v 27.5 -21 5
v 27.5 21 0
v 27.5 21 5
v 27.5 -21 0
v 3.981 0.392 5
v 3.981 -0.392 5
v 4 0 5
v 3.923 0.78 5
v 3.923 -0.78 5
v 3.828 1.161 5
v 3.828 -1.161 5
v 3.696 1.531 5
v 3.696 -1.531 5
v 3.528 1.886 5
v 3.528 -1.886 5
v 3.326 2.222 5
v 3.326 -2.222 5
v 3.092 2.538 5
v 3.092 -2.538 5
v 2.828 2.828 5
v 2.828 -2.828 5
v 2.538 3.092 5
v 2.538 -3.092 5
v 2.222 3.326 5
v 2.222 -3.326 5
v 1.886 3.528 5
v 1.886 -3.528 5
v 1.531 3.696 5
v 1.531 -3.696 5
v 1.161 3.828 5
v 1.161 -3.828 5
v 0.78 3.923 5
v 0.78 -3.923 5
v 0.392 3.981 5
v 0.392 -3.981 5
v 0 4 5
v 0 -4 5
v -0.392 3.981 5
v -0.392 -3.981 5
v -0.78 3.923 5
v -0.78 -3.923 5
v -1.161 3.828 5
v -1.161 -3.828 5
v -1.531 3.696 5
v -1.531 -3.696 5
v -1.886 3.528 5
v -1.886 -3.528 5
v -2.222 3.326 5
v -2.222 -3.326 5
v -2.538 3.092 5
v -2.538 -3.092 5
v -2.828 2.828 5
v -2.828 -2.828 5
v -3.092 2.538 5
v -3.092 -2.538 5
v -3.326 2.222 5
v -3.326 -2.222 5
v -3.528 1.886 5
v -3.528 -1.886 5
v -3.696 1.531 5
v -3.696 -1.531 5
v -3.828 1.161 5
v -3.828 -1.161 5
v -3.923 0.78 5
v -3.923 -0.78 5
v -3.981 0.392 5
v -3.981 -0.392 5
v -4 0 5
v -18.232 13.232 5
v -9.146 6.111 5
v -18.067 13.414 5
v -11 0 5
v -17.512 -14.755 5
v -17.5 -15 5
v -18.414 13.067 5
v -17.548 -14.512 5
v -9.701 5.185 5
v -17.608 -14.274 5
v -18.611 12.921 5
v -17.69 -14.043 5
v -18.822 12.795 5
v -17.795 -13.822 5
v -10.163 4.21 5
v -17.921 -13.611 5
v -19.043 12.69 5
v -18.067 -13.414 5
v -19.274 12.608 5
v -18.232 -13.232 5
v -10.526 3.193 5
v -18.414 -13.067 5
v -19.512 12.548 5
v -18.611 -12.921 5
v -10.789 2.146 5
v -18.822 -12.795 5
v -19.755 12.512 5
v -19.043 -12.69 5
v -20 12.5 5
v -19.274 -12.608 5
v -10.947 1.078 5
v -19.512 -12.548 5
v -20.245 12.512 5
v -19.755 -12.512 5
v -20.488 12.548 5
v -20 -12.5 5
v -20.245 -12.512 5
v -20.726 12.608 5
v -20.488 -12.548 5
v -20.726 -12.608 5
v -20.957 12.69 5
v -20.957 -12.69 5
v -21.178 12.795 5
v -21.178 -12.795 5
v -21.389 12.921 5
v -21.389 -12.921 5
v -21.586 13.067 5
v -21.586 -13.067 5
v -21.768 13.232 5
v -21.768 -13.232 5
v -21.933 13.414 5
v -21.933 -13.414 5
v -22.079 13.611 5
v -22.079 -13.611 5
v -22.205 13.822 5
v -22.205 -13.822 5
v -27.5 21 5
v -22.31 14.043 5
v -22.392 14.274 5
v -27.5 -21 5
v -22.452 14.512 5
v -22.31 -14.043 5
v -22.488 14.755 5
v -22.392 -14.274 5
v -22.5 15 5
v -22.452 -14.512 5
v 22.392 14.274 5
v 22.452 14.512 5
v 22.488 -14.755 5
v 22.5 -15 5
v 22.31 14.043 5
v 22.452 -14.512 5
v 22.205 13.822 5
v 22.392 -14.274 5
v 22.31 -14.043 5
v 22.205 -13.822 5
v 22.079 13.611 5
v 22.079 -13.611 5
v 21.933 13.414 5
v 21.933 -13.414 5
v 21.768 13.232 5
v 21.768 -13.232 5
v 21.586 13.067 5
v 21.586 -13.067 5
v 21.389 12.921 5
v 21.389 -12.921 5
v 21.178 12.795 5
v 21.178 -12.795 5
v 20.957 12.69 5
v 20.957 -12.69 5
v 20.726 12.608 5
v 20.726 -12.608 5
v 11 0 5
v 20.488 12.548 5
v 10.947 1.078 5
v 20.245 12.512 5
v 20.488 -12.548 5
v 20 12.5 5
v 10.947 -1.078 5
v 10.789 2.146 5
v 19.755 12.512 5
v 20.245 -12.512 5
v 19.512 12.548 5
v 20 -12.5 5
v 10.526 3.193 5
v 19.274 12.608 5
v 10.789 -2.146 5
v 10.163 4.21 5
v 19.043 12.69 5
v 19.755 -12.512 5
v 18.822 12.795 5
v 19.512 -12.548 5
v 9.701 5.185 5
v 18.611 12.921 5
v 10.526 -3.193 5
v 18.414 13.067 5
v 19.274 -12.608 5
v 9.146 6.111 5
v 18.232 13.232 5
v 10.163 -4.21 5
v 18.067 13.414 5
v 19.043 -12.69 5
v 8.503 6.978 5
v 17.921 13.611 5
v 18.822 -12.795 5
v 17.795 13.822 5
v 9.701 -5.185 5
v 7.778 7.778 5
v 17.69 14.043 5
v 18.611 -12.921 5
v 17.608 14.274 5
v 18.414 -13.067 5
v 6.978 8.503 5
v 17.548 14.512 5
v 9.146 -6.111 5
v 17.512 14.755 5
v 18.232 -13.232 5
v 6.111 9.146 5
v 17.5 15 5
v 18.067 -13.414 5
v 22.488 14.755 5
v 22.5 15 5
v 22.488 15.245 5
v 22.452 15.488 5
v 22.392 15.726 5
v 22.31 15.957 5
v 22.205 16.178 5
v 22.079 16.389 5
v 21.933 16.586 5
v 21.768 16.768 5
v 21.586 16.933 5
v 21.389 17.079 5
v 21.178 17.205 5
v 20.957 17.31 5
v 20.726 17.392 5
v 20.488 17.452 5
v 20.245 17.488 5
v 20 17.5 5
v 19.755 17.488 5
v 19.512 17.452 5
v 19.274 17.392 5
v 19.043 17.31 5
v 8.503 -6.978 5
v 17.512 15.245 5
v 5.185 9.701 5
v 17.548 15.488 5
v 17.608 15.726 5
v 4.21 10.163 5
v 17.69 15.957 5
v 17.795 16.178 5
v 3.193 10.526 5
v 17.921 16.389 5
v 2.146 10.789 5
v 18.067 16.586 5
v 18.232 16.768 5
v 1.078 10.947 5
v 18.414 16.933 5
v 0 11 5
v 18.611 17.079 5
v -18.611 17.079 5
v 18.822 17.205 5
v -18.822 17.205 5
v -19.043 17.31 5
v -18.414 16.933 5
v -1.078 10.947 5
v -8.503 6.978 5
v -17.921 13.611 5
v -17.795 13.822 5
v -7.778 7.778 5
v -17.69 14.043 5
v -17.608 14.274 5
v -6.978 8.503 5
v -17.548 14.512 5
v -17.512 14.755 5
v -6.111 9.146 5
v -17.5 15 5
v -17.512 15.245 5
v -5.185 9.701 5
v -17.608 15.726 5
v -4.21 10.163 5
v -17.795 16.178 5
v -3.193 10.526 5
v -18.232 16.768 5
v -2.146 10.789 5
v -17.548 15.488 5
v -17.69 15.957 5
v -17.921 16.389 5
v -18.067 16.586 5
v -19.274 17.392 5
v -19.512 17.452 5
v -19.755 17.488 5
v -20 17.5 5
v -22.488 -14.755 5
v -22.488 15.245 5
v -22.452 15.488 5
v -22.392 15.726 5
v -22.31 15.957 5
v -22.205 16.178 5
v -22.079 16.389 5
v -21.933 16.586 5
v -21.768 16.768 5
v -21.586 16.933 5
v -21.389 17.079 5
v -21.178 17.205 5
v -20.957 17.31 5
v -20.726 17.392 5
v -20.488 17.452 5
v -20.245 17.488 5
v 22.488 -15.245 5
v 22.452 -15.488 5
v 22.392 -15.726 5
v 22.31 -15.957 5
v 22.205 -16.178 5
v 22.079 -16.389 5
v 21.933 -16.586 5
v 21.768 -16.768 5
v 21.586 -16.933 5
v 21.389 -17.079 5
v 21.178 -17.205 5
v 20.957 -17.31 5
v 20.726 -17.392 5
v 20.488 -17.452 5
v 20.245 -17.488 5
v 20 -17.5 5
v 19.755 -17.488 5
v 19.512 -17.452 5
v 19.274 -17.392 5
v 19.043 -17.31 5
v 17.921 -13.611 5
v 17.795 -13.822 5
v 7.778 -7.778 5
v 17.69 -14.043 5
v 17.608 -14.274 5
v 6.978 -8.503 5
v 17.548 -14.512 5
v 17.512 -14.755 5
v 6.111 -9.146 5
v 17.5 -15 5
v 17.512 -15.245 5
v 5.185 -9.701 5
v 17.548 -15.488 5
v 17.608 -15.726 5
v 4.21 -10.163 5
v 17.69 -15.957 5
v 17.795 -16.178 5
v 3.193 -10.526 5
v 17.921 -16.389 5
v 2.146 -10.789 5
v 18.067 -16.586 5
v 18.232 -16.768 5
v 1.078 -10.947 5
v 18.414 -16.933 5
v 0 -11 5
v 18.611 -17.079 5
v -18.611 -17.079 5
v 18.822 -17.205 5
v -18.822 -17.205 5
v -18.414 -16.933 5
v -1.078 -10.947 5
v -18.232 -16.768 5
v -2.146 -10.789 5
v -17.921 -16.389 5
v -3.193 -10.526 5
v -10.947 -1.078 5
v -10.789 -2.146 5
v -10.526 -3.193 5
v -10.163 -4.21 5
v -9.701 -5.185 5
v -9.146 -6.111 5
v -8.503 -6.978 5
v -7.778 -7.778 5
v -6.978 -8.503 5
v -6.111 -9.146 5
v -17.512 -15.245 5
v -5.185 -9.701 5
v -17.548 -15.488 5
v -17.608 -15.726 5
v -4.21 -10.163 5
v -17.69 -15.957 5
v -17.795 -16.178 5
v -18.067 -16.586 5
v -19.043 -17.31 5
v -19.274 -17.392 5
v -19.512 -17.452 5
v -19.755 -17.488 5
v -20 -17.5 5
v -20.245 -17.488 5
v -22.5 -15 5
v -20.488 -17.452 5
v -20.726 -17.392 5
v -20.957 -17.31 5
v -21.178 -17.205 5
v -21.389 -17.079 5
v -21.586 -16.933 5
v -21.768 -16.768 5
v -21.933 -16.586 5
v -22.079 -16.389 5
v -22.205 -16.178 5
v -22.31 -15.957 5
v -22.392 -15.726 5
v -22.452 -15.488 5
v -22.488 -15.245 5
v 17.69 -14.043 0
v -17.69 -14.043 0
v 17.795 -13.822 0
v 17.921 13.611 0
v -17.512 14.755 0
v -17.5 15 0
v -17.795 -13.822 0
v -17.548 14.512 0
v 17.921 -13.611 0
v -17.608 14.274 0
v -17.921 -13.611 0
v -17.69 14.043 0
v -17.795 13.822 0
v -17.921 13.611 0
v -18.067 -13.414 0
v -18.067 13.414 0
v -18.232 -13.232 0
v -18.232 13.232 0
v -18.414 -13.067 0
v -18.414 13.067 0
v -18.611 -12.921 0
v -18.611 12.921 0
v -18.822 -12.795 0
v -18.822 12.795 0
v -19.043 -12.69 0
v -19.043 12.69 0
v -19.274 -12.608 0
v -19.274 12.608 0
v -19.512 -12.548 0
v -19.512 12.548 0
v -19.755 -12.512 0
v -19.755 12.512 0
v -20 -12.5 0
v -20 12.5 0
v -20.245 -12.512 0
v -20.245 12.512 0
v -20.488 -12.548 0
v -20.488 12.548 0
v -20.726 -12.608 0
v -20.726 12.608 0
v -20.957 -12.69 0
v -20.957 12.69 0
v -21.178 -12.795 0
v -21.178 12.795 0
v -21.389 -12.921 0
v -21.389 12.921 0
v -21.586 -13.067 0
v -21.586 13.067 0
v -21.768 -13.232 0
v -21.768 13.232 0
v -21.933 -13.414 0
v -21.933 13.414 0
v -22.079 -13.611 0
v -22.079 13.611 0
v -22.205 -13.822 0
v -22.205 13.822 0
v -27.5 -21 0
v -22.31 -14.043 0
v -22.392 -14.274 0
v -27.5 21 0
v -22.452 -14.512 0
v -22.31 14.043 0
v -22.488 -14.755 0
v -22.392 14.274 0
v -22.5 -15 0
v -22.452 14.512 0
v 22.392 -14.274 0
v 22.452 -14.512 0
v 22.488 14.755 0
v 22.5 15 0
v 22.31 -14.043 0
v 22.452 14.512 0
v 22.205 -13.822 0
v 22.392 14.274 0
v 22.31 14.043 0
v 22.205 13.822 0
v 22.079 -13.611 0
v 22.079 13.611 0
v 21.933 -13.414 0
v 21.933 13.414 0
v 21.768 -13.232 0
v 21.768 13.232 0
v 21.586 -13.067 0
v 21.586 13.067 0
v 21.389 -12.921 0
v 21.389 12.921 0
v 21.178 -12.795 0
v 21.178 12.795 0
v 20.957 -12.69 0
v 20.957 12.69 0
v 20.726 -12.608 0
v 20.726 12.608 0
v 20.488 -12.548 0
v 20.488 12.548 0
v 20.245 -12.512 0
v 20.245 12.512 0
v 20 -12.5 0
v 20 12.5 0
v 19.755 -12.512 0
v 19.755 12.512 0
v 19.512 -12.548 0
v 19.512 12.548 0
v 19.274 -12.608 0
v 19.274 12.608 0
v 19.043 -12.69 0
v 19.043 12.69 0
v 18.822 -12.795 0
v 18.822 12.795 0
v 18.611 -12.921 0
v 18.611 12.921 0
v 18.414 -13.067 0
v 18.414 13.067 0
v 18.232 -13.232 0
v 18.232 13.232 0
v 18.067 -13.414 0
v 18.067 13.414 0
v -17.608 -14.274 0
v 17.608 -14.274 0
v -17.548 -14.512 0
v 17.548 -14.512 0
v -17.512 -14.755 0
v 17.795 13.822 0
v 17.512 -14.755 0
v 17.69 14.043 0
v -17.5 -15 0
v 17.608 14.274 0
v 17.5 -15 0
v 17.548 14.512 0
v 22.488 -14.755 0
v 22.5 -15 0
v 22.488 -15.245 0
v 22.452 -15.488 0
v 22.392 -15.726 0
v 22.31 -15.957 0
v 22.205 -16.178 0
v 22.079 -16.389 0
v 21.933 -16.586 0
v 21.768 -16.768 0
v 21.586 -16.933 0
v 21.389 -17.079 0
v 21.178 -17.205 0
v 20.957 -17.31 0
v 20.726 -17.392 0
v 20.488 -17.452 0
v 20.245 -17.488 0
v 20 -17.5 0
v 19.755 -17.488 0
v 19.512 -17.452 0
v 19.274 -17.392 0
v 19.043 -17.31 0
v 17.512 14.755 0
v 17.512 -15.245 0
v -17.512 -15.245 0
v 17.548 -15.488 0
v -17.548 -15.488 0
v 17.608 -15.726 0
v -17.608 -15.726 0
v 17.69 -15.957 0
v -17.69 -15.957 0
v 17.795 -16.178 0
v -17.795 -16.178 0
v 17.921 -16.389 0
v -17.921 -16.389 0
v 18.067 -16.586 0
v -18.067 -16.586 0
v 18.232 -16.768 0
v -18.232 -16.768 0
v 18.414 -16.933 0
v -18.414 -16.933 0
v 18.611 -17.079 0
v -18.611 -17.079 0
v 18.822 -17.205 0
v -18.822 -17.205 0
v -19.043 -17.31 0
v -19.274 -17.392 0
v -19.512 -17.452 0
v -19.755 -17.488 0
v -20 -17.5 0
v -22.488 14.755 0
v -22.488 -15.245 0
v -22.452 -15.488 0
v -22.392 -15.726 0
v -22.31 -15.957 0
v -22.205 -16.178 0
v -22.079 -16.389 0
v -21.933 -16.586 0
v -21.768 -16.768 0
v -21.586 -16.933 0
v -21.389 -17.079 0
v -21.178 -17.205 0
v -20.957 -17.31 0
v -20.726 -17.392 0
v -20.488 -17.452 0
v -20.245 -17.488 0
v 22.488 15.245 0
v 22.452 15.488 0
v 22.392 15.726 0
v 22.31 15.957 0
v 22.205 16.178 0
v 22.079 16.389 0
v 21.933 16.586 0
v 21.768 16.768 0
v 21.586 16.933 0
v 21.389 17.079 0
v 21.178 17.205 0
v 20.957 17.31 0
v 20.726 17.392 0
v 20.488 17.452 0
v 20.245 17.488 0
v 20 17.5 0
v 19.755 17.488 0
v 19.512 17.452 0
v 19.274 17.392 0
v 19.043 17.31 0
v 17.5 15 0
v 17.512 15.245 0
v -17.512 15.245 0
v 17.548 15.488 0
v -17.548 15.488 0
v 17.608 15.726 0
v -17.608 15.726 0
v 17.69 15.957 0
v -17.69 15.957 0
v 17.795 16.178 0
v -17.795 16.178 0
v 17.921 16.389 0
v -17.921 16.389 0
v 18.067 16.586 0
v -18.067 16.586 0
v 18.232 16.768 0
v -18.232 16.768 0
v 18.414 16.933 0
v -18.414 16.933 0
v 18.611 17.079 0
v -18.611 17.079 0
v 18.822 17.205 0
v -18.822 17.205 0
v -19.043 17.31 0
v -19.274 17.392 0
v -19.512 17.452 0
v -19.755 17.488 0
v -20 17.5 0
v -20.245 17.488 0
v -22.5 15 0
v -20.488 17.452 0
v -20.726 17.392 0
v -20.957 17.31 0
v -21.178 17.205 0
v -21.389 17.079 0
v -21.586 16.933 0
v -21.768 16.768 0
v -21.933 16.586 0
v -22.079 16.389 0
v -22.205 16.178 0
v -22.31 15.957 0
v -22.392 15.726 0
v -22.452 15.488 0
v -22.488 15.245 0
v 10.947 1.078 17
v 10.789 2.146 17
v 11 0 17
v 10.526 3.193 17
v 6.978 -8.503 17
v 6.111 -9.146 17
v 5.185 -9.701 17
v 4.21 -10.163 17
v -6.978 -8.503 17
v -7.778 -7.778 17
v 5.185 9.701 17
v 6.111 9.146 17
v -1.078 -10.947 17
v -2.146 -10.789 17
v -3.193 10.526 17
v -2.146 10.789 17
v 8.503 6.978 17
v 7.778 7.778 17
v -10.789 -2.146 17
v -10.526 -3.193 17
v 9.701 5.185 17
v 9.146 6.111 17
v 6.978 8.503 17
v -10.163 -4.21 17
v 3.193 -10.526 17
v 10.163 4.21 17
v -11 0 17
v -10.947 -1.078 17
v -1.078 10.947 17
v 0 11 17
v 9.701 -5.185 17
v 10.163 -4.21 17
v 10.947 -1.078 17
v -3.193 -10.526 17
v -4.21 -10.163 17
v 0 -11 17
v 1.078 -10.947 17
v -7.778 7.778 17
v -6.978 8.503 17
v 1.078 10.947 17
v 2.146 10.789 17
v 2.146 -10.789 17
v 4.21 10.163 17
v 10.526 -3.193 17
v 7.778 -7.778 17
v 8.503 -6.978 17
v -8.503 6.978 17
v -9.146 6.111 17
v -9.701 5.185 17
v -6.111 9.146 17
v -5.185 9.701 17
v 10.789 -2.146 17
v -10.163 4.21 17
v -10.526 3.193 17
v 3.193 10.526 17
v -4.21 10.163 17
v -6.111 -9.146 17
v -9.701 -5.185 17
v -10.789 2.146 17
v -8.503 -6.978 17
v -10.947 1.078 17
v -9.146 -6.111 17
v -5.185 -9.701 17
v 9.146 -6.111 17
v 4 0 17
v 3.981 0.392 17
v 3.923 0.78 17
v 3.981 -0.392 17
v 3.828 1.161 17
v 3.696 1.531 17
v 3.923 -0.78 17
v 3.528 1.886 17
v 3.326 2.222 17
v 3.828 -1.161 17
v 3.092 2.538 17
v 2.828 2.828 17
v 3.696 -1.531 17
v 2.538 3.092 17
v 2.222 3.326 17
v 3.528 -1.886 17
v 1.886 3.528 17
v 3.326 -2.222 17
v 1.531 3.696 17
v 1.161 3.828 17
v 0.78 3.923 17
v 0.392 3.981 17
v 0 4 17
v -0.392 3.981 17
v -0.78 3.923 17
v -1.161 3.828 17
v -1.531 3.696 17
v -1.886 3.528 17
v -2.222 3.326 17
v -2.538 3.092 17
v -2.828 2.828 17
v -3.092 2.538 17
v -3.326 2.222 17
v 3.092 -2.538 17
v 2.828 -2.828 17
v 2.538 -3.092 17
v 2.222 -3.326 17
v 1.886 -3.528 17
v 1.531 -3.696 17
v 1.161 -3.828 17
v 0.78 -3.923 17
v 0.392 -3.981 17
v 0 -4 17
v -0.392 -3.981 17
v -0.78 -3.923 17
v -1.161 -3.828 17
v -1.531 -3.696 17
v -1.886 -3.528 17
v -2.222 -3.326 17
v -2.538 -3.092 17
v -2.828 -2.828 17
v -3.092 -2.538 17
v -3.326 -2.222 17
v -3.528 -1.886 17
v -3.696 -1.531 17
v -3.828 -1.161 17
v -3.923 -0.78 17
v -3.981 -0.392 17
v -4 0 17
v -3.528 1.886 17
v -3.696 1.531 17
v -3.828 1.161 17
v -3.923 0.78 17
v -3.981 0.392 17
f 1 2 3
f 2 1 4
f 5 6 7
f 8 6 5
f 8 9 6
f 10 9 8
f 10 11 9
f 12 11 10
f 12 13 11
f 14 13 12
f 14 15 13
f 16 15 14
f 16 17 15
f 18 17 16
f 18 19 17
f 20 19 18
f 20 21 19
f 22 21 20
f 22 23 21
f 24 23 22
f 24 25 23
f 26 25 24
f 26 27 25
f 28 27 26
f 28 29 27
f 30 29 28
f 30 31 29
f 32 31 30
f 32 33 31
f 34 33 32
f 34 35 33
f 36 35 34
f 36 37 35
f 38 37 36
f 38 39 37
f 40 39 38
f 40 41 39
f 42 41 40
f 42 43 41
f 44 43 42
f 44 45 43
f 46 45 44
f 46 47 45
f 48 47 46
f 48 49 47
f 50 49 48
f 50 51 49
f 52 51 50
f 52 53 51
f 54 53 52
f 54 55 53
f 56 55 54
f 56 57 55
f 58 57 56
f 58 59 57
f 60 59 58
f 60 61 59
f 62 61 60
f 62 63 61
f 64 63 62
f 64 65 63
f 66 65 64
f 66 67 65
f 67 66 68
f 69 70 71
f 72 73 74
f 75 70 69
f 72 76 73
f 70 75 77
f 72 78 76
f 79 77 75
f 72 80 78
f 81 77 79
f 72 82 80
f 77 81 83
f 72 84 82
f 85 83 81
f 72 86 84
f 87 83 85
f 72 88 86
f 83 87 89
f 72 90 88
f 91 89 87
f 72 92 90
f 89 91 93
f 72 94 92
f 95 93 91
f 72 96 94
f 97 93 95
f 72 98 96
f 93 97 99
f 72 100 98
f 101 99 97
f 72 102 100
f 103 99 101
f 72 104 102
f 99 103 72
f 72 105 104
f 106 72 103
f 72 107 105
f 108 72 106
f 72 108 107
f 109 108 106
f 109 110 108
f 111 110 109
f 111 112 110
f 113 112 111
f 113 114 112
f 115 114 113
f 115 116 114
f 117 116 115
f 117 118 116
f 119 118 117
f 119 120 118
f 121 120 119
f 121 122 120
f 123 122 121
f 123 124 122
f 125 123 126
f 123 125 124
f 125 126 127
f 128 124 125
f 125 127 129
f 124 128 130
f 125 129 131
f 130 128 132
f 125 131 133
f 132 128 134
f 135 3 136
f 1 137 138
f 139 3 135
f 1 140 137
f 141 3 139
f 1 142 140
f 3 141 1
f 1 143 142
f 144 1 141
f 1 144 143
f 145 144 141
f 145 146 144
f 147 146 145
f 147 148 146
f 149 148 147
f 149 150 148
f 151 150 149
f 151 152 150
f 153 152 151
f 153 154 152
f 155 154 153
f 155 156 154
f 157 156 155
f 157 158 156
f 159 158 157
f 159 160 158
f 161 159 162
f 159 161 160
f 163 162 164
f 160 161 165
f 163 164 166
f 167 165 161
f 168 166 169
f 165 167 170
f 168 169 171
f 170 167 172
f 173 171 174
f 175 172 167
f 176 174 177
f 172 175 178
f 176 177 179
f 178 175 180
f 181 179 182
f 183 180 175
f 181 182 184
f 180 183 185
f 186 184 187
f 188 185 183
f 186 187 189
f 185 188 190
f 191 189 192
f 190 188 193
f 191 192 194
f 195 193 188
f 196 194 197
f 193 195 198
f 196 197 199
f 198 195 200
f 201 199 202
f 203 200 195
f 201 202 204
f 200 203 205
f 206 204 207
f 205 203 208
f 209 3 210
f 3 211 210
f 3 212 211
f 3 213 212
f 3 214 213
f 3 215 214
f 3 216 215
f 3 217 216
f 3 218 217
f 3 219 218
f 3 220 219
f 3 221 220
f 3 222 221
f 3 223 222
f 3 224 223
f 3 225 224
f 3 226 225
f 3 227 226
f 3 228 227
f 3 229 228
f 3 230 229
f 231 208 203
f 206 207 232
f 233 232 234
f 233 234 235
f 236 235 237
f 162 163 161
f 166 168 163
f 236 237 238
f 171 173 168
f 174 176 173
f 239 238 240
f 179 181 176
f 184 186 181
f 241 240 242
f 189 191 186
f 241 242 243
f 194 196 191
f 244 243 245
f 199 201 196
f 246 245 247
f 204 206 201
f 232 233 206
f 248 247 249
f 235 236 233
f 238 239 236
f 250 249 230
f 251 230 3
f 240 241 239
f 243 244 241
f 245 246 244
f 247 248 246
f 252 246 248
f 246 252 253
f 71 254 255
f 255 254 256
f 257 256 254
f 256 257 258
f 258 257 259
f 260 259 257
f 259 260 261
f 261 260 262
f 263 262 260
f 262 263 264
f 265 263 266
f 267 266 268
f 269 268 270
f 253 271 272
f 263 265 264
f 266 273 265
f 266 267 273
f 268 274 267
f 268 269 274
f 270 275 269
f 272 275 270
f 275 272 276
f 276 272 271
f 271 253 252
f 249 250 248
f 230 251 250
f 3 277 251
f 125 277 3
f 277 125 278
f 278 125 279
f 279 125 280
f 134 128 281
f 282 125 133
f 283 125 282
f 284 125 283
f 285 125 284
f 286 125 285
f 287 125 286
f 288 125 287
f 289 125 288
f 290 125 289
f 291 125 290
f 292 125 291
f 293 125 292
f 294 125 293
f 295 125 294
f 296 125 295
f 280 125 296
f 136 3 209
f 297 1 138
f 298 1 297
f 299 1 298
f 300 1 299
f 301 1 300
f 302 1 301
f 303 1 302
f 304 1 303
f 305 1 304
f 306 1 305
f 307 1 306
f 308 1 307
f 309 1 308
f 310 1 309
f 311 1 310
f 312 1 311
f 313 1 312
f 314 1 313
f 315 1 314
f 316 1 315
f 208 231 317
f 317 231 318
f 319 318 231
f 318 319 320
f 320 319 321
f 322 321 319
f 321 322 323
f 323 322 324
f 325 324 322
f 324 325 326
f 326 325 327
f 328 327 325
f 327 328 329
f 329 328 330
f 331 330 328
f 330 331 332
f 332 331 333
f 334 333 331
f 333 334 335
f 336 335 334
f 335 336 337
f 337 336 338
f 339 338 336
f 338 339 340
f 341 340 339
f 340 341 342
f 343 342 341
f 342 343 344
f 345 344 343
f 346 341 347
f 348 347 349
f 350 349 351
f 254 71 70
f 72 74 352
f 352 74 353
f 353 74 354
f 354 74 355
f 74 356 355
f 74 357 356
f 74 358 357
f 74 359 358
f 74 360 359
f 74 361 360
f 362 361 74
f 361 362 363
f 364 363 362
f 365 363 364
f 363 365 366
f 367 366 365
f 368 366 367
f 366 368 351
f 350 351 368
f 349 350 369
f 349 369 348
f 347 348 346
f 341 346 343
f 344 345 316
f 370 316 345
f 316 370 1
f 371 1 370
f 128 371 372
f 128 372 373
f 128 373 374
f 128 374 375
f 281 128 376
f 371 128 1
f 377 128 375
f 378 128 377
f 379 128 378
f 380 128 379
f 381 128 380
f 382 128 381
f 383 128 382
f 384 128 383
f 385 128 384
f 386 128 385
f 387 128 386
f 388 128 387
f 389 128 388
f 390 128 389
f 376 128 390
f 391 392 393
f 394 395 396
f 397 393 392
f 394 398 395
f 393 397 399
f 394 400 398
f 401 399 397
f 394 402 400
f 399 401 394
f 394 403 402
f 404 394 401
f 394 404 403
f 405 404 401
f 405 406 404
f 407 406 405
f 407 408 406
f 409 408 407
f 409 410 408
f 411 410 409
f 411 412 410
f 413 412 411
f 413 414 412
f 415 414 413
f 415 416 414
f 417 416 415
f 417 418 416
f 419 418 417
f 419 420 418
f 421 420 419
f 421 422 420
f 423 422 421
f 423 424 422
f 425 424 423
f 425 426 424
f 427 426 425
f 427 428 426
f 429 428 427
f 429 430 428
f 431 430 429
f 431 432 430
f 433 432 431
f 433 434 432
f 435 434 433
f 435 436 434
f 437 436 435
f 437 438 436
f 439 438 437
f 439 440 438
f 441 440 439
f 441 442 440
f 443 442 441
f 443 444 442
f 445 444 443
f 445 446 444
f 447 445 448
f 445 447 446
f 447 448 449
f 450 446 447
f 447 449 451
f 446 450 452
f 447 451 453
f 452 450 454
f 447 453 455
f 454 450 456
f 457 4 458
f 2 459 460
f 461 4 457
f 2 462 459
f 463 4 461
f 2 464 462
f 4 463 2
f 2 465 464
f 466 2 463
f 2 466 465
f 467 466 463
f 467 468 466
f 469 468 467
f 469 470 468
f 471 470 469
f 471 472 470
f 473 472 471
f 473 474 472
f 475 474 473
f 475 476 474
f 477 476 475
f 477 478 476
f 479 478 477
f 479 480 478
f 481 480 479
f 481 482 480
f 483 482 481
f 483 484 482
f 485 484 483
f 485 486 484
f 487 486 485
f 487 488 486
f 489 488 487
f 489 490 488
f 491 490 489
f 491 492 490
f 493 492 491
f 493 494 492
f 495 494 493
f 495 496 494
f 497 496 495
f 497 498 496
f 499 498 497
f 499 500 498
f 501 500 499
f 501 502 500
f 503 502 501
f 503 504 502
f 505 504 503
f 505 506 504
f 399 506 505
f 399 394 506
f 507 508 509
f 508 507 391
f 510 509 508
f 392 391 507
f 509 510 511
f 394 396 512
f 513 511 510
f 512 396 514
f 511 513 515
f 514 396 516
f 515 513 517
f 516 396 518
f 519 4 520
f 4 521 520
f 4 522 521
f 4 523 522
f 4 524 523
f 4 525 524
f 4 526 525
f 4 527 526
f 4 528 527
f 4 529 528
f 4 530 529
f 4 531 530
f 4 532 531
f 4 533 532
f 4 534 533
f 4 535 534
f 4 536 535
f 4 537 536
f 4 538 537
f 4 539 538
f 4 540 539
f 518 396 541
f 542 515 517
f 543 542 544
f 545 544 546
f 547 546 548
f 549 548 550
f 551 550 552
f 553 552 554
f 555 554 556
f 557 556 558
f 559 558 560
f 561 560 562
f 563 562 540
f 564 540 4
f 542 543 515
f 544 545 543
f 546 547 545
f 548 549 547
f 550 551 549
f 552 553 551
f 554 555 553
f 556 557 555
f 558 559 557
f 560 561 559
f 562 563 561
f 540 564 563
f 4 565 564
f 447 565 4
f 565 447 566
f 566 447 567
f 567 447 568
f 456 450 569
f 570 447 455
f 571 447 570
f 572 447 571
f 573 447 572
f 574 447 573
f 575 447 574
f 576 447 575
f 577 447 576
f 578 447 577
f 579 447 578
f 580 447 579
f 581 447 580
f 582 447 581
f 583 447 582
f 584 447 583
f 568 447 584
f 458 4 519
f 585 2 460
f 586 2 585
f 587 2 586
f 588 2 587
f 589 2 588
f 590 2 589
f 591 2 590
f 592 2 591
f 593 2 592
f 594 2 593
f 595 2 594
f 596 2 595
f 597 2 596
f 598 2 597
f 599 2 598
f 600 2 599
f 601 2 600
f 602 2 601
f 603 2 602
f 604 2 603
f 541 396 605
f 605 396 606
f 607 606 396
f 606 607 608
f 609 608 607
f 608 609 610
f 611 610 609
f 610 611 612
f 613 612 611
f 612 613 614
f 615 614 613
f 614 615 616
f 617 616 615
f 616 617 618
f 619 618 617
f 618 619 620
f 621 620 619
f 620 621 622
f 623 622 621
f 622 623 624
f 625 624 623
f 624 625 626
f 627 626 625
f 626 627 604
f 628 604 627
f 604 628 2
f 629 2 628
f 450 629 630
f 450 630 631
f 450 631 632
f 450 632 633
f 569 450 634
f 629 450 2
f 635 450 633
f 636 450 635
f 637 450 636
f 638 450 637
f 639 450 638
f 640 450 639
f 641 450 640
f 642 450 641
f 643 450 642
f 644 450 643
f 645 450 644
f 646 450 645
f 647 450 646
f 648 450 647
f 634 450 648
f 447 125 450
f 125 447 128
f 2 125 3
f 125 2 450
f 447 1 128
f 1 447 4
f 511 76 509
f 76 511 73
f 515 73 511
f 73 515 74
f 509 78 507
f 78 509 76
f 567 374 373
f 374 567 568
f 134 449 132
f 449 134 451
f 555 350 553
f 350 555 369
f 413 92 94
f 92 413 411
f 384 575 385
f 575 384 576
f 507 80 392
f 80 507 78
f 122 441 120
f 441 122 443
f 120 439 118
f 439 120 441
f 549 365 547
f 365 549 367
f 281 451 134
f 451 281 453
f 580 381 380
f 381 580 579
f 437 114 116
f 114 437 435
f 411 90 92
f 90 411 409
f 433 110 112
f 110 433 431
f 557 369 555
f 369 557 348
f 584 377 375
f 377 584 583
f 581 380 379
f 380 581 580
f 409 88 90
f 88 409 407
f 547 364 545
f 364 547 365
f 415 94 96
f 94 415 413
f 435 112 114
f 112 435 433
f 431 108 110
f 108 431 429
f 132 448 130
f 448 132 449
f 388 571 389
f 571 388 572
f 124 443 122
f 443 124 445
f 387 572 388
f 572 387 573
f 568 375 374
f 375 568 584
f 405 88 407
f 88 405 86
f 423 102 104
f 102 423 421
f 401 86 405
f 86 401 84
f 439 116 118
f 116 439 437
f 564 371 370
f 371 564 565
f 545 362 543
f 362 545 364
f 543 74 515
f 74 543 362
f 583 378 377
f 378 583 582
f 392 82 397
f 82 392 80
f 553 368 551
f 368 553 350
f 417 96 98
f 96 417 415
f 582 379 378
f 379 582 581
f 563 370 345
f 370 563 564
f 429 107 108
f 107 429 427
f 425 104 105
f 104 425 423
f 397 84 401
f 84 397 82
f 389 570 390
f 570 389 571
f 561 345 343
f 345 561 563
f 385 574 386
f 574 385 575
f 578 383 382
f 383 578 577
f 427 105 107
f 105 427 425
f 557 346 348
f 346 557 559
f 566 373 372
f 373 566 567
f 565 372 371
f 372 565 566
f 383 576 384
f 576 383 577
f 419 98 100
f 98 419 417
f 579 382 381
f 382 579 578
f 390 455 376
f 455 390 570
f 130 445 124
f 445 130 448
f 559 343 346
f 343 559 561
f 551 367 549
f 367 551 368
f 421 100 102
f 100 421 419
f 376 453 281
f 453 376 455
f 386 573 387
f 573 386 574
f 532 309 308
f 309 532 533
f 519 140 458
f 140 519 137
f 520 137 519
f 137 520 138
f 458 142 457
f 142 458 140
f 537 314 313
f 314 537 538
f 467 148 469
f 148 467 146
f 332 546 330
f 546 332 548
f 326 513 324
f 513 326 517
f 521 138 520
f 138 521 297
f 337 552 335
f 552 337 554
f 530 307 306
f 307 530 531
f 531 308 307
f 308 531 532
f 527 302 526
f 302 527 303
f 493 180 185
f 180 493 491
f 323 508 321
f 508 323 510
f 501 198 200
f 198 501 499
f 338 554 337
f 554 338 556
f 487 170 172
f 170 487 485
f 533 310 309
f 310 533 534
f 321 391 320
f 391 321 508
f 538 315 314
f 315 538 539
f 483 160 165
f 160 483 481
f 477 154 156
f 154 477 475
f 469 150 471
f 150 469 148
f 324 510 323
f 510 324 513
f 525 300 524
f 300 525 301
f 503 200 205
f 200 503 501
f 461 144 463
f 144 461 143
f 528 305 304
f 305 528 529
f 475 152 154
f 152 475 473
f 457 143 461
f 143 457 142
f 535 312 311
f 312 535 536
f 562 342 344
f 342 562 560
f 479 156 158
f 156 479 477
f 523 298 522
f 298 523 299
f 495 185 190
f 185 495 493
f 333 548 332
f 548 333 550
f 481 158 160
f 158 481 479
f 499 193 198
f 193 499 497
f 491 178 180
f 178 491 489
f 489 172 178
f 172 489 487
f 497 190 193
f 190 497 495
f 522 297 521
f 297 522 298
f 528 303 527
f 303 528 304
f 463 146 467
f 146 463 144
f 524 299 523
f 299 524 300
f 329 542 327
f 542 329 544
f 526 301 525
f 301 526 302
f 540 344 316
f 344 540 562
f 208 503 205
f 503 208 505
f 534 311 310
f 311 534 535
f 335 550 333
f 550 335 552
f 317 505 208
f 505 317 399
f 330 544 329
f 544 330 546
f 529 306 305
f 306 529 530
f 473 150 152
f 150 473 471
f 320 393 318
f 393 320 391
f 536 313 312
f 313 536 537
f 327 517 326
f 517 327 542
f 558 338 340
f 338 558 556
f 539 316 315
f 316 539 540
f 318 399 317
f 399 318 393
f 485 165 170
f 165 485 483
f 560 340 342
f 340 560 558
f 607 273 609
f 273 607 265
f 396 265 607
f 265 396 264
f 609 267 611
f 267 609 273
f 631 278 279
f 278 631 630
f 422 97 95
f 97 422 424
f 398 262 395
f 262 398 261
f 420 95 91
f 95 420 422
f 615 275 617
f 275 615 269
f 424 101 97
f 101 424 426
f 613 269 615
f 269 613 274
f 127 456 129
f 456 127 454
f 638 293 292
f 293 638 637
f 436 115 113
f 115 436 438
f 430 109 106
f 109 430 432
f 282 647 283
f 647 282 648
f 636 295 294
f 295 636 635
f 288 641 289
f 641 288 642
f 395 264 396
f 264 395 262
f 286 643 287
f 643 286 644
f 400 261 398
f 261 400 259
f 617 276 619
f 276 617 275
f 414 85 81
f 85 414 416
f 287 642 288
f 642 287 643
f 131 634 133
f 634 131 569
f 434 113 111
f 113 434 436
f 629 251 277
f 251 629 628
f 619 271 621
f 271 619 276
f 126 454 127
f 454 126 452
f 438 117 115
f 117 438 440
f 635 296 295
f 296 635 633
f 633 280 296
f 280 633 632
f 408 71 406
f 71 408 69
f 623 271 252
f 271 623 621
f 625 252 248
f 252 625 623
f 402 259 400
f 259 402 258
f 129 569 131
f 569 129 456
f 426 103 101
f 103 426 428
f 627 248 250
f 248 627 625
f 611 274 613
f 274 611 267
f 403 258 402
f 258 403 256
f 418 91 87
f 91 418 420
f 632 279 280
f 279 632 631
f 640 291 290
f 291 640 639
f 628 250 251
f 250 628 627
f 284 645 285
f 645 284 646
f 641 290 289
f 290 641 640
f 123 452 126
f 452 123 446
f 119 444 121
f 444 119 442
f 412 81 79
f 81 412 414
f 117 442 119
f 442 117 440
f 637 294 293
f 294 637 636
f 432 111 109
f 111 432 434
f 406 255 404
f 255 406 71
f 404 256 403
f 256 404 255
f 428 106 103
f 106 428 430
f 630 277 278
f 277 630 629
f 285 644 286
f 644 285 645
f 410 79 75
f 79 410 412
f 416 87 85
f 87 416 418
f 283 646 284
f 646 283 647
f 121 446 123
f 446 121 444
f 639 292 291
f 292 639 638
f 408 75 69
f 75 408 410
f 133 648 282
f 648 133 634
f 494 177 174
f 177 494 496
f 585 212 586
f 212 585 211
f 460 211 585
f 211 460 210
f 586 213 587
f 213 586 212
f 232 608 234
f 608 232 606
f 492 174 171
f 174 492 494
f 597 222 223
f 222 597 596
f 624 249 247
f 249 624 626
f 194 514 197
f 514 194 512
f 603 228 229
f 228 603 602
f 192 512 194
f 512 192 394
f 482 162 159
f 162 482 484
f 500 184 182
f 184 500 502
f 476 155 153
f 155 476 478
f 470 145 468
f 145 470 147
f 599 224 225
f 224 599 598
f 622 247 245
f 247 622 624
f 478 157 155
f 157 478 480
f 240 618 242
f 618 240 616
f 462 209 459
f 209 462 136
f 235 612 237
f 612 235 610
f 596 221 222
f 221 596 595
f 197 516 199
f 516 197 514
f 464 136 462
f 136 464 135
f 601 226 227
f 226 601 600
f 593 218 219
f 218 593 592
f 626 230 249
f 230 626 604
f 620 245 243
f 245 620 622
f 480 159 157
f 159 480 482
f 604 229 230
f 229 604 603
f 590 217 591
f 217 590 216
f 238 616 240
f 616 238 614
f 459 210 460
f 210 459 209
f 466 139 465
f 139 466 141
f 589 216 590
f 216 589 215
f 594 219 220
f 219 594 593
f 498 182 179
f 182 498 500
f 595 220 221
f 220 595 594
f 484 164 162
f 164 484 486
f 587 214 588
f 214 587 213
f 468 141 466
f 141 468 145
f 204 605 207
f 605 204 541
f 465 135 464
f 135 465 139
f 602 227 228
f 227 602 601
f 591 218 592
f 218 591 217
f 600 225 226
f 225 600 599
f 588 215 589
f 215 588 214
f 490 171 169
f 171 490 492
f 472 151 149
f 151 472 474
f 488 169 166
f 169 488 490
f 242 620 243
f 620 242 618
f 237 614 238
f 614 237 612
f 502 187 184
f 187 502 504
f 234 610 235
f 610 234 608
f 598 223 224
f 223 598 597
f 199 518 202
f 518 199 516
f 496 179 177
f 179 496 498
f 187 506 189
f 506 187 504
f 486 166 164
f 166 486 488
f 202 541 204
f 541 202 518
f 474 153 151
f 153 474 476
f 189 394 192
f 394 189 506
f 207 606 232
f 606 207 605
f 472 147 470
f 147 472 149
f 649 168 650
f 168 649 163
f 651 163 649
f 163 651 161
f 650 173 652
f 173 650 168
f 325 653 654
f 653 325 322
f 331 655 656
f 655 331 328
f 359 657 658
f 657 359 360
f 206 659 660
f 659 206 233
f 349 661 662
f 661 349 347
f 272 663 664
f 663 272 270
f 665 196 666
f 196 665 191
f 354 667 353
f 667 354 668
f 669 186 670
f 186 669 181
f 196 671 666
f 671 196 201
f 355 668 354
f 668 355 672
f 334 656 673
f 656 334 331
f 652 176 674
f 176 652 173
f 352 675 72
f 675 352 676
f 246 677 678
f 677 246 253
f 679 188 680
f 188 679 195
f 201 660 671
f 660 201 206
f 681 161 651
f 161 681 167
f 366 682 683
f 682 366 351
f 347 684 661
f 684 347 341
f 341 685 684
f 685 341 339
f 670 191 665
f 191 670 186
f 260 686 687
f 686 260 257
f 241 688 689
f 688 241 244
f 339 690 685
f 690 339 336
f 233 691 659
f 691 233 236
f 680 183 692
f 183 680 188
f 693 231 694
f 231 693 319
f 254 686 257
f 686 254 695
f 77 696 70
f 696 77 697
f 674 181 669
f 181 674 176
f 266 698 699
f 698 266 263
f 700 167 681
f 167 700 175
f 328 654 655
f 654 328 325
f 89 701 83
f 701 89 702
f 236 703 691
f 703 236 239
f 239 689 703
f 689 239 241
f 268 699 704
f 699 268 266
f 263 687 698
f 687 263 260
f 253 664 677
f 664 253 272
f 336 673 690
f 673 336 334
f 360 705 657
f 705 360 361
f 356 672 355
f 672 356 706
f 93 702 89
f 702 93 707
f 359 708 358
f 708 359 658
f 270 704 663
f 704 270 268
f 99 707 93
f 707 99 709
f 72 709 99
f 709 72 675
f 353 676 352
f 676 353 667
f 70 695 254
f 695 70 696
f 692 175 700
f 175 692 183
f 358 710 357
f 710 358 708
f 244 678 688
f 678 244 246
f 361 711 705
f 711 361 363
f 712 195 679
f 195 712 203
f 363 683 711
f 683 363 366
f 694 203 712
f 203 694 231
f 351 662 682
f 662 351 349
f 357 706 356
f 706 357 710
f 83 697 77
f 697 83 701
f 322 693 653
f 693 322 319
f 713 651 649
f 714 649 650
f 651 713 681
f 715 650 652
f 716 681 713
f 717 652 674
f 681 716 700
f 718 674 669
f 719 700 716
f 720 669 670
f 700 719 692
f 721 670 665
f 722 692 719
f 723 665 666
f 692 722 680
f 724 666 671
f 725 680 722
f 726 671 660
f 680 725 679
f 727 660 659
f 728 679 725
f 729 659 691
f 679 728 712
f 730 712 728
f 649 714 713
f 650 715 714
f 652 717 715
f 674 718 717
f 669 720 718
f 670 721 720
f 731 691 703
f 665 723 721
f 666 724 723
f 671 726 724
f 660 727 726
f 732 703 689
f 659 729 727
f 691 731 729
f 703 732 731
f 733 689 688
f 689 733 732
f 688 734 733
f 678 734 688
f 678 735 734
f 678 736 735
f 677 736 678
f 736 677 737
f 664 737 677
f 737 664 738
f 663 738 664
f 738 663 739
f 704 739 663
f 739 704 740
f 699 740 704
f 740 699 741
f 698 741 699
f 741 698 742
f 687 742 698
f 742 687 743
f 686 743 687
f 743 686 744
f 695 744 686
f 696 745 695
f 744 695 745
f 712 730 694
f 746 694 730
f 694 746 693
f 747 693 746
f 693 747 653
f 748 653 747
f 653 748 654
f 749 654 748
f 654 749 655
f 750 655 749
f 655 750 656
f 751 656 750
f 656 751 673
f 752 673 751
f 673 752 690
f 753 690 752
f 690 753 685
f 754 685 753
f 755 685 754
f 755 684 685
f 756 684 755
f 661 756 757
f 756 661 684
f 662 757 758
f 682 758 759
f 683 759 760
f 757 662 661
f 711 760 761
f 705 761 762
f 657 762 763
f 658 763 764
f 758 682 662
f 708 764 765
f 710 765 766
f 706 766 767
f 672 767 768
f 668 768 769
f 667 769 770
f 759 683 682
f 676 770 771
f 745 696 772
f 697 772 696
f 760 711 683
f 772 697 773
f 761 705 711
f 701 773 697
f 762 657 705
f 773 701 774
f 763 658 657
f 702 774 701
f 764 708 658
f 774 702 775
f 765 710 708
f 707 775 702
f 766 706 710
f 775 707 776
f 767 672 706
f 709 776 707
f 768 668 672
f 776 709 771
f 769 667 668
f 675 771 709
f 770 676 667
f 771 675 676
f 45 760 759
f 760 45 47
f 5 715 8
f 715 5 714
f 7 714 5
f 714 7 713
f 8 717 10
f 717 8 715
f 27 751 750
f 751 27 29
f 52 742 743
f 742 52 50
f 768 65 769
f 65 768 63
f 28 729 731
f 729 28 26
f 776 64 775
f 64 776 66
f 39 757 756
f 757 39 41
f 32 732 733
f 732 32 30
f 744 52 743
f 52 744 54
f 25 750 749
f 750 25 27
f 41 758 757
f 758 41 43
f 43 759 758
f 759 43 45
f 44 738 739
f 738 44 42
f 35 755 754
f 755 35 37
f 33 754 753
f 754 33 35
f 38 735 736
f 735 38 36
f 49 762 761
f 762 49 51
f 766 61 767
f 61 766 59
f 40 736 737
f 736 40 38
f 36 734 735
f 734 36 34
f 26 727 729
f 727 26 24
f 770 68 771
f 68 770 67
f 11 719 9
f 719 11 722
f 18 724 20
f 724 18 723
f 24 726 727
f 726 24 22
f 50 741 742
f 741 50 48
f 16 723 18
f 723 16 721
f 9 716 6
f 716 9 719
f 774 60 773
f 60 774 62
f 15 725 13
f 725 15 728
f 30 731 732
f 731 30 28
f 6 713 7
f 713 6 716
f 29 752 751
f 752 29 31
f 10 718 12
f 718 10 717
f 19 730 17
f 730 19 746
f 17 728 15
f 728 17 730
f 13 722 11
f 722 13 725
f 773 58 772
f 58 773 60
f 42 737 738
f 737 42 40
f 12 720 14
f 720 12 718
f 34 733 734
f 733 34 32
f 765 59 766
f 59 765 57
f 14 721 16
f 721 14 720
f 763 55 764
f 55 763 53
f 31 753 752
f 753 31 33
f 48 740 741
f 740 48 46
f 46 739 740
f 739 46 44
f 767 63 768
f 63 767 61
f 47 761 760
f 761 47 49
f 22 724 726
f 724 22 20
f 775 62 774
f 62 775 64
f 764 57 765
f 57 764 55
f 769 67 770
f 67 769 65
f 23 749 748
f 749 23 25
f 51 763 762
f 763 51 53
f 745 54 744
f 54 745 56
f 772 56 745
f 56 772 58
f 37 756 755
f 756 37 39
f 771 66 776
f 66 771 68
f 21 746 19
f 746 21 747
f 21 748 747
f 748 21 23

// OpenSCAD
module pillow_block_bearing() {
    // Base dimensions
    base_length = 55.0;
    base_width = 42.0;
    base_height = 5.0;
    
    // Bearing dimensions
    bearing_outer_diameter = 22.0;
    bearing_inner_diameter = 8.0;
    bearing_height = 12.0;
    
    // Hole dimensions
    hole_diameter = 5.0;
    hole_offset_x = 20.0;
    hole_offset_y = 15.0;
    
    // Create base
    difference() {
        translate([-base_length/2, -base_width/2, 0])
            cube([base_length, base_width, base_height]);
        
        // Create mounting holes
        translate([-hole_offset_x, -hole_offset_y, -1])
            cylinder(h=base_height + 2, d=hole_diameter, $fn=64);
        translate([hole_offset_x, -hole_offset_y, -1])
            cylinder(h=base_height + 2, d=hole_diameter, $fn=64);
        translate([-hole_offset_x, hole_offset_y, -1])
            cylinder(h=base_height + 2, d=hole_diameter, $fn=64);
        translate([hole_offset_x, hole_offset_y, -1])
            cylinder(h=base_height + 2, d=hole_diameter, $fn=64);
    }
    
    // Create bearing holder
    translate([0, 0, base_height])
        difference() {
            cylinder(h=bearing_height, d=bearing_outer_diameter, $fn=64);
            translate([0, 0, -1])
                cylinder(h=bearing_height + 2, d=bearing_inner_diameter, $fn=64);
        }
}

pillow_block_bearing();
